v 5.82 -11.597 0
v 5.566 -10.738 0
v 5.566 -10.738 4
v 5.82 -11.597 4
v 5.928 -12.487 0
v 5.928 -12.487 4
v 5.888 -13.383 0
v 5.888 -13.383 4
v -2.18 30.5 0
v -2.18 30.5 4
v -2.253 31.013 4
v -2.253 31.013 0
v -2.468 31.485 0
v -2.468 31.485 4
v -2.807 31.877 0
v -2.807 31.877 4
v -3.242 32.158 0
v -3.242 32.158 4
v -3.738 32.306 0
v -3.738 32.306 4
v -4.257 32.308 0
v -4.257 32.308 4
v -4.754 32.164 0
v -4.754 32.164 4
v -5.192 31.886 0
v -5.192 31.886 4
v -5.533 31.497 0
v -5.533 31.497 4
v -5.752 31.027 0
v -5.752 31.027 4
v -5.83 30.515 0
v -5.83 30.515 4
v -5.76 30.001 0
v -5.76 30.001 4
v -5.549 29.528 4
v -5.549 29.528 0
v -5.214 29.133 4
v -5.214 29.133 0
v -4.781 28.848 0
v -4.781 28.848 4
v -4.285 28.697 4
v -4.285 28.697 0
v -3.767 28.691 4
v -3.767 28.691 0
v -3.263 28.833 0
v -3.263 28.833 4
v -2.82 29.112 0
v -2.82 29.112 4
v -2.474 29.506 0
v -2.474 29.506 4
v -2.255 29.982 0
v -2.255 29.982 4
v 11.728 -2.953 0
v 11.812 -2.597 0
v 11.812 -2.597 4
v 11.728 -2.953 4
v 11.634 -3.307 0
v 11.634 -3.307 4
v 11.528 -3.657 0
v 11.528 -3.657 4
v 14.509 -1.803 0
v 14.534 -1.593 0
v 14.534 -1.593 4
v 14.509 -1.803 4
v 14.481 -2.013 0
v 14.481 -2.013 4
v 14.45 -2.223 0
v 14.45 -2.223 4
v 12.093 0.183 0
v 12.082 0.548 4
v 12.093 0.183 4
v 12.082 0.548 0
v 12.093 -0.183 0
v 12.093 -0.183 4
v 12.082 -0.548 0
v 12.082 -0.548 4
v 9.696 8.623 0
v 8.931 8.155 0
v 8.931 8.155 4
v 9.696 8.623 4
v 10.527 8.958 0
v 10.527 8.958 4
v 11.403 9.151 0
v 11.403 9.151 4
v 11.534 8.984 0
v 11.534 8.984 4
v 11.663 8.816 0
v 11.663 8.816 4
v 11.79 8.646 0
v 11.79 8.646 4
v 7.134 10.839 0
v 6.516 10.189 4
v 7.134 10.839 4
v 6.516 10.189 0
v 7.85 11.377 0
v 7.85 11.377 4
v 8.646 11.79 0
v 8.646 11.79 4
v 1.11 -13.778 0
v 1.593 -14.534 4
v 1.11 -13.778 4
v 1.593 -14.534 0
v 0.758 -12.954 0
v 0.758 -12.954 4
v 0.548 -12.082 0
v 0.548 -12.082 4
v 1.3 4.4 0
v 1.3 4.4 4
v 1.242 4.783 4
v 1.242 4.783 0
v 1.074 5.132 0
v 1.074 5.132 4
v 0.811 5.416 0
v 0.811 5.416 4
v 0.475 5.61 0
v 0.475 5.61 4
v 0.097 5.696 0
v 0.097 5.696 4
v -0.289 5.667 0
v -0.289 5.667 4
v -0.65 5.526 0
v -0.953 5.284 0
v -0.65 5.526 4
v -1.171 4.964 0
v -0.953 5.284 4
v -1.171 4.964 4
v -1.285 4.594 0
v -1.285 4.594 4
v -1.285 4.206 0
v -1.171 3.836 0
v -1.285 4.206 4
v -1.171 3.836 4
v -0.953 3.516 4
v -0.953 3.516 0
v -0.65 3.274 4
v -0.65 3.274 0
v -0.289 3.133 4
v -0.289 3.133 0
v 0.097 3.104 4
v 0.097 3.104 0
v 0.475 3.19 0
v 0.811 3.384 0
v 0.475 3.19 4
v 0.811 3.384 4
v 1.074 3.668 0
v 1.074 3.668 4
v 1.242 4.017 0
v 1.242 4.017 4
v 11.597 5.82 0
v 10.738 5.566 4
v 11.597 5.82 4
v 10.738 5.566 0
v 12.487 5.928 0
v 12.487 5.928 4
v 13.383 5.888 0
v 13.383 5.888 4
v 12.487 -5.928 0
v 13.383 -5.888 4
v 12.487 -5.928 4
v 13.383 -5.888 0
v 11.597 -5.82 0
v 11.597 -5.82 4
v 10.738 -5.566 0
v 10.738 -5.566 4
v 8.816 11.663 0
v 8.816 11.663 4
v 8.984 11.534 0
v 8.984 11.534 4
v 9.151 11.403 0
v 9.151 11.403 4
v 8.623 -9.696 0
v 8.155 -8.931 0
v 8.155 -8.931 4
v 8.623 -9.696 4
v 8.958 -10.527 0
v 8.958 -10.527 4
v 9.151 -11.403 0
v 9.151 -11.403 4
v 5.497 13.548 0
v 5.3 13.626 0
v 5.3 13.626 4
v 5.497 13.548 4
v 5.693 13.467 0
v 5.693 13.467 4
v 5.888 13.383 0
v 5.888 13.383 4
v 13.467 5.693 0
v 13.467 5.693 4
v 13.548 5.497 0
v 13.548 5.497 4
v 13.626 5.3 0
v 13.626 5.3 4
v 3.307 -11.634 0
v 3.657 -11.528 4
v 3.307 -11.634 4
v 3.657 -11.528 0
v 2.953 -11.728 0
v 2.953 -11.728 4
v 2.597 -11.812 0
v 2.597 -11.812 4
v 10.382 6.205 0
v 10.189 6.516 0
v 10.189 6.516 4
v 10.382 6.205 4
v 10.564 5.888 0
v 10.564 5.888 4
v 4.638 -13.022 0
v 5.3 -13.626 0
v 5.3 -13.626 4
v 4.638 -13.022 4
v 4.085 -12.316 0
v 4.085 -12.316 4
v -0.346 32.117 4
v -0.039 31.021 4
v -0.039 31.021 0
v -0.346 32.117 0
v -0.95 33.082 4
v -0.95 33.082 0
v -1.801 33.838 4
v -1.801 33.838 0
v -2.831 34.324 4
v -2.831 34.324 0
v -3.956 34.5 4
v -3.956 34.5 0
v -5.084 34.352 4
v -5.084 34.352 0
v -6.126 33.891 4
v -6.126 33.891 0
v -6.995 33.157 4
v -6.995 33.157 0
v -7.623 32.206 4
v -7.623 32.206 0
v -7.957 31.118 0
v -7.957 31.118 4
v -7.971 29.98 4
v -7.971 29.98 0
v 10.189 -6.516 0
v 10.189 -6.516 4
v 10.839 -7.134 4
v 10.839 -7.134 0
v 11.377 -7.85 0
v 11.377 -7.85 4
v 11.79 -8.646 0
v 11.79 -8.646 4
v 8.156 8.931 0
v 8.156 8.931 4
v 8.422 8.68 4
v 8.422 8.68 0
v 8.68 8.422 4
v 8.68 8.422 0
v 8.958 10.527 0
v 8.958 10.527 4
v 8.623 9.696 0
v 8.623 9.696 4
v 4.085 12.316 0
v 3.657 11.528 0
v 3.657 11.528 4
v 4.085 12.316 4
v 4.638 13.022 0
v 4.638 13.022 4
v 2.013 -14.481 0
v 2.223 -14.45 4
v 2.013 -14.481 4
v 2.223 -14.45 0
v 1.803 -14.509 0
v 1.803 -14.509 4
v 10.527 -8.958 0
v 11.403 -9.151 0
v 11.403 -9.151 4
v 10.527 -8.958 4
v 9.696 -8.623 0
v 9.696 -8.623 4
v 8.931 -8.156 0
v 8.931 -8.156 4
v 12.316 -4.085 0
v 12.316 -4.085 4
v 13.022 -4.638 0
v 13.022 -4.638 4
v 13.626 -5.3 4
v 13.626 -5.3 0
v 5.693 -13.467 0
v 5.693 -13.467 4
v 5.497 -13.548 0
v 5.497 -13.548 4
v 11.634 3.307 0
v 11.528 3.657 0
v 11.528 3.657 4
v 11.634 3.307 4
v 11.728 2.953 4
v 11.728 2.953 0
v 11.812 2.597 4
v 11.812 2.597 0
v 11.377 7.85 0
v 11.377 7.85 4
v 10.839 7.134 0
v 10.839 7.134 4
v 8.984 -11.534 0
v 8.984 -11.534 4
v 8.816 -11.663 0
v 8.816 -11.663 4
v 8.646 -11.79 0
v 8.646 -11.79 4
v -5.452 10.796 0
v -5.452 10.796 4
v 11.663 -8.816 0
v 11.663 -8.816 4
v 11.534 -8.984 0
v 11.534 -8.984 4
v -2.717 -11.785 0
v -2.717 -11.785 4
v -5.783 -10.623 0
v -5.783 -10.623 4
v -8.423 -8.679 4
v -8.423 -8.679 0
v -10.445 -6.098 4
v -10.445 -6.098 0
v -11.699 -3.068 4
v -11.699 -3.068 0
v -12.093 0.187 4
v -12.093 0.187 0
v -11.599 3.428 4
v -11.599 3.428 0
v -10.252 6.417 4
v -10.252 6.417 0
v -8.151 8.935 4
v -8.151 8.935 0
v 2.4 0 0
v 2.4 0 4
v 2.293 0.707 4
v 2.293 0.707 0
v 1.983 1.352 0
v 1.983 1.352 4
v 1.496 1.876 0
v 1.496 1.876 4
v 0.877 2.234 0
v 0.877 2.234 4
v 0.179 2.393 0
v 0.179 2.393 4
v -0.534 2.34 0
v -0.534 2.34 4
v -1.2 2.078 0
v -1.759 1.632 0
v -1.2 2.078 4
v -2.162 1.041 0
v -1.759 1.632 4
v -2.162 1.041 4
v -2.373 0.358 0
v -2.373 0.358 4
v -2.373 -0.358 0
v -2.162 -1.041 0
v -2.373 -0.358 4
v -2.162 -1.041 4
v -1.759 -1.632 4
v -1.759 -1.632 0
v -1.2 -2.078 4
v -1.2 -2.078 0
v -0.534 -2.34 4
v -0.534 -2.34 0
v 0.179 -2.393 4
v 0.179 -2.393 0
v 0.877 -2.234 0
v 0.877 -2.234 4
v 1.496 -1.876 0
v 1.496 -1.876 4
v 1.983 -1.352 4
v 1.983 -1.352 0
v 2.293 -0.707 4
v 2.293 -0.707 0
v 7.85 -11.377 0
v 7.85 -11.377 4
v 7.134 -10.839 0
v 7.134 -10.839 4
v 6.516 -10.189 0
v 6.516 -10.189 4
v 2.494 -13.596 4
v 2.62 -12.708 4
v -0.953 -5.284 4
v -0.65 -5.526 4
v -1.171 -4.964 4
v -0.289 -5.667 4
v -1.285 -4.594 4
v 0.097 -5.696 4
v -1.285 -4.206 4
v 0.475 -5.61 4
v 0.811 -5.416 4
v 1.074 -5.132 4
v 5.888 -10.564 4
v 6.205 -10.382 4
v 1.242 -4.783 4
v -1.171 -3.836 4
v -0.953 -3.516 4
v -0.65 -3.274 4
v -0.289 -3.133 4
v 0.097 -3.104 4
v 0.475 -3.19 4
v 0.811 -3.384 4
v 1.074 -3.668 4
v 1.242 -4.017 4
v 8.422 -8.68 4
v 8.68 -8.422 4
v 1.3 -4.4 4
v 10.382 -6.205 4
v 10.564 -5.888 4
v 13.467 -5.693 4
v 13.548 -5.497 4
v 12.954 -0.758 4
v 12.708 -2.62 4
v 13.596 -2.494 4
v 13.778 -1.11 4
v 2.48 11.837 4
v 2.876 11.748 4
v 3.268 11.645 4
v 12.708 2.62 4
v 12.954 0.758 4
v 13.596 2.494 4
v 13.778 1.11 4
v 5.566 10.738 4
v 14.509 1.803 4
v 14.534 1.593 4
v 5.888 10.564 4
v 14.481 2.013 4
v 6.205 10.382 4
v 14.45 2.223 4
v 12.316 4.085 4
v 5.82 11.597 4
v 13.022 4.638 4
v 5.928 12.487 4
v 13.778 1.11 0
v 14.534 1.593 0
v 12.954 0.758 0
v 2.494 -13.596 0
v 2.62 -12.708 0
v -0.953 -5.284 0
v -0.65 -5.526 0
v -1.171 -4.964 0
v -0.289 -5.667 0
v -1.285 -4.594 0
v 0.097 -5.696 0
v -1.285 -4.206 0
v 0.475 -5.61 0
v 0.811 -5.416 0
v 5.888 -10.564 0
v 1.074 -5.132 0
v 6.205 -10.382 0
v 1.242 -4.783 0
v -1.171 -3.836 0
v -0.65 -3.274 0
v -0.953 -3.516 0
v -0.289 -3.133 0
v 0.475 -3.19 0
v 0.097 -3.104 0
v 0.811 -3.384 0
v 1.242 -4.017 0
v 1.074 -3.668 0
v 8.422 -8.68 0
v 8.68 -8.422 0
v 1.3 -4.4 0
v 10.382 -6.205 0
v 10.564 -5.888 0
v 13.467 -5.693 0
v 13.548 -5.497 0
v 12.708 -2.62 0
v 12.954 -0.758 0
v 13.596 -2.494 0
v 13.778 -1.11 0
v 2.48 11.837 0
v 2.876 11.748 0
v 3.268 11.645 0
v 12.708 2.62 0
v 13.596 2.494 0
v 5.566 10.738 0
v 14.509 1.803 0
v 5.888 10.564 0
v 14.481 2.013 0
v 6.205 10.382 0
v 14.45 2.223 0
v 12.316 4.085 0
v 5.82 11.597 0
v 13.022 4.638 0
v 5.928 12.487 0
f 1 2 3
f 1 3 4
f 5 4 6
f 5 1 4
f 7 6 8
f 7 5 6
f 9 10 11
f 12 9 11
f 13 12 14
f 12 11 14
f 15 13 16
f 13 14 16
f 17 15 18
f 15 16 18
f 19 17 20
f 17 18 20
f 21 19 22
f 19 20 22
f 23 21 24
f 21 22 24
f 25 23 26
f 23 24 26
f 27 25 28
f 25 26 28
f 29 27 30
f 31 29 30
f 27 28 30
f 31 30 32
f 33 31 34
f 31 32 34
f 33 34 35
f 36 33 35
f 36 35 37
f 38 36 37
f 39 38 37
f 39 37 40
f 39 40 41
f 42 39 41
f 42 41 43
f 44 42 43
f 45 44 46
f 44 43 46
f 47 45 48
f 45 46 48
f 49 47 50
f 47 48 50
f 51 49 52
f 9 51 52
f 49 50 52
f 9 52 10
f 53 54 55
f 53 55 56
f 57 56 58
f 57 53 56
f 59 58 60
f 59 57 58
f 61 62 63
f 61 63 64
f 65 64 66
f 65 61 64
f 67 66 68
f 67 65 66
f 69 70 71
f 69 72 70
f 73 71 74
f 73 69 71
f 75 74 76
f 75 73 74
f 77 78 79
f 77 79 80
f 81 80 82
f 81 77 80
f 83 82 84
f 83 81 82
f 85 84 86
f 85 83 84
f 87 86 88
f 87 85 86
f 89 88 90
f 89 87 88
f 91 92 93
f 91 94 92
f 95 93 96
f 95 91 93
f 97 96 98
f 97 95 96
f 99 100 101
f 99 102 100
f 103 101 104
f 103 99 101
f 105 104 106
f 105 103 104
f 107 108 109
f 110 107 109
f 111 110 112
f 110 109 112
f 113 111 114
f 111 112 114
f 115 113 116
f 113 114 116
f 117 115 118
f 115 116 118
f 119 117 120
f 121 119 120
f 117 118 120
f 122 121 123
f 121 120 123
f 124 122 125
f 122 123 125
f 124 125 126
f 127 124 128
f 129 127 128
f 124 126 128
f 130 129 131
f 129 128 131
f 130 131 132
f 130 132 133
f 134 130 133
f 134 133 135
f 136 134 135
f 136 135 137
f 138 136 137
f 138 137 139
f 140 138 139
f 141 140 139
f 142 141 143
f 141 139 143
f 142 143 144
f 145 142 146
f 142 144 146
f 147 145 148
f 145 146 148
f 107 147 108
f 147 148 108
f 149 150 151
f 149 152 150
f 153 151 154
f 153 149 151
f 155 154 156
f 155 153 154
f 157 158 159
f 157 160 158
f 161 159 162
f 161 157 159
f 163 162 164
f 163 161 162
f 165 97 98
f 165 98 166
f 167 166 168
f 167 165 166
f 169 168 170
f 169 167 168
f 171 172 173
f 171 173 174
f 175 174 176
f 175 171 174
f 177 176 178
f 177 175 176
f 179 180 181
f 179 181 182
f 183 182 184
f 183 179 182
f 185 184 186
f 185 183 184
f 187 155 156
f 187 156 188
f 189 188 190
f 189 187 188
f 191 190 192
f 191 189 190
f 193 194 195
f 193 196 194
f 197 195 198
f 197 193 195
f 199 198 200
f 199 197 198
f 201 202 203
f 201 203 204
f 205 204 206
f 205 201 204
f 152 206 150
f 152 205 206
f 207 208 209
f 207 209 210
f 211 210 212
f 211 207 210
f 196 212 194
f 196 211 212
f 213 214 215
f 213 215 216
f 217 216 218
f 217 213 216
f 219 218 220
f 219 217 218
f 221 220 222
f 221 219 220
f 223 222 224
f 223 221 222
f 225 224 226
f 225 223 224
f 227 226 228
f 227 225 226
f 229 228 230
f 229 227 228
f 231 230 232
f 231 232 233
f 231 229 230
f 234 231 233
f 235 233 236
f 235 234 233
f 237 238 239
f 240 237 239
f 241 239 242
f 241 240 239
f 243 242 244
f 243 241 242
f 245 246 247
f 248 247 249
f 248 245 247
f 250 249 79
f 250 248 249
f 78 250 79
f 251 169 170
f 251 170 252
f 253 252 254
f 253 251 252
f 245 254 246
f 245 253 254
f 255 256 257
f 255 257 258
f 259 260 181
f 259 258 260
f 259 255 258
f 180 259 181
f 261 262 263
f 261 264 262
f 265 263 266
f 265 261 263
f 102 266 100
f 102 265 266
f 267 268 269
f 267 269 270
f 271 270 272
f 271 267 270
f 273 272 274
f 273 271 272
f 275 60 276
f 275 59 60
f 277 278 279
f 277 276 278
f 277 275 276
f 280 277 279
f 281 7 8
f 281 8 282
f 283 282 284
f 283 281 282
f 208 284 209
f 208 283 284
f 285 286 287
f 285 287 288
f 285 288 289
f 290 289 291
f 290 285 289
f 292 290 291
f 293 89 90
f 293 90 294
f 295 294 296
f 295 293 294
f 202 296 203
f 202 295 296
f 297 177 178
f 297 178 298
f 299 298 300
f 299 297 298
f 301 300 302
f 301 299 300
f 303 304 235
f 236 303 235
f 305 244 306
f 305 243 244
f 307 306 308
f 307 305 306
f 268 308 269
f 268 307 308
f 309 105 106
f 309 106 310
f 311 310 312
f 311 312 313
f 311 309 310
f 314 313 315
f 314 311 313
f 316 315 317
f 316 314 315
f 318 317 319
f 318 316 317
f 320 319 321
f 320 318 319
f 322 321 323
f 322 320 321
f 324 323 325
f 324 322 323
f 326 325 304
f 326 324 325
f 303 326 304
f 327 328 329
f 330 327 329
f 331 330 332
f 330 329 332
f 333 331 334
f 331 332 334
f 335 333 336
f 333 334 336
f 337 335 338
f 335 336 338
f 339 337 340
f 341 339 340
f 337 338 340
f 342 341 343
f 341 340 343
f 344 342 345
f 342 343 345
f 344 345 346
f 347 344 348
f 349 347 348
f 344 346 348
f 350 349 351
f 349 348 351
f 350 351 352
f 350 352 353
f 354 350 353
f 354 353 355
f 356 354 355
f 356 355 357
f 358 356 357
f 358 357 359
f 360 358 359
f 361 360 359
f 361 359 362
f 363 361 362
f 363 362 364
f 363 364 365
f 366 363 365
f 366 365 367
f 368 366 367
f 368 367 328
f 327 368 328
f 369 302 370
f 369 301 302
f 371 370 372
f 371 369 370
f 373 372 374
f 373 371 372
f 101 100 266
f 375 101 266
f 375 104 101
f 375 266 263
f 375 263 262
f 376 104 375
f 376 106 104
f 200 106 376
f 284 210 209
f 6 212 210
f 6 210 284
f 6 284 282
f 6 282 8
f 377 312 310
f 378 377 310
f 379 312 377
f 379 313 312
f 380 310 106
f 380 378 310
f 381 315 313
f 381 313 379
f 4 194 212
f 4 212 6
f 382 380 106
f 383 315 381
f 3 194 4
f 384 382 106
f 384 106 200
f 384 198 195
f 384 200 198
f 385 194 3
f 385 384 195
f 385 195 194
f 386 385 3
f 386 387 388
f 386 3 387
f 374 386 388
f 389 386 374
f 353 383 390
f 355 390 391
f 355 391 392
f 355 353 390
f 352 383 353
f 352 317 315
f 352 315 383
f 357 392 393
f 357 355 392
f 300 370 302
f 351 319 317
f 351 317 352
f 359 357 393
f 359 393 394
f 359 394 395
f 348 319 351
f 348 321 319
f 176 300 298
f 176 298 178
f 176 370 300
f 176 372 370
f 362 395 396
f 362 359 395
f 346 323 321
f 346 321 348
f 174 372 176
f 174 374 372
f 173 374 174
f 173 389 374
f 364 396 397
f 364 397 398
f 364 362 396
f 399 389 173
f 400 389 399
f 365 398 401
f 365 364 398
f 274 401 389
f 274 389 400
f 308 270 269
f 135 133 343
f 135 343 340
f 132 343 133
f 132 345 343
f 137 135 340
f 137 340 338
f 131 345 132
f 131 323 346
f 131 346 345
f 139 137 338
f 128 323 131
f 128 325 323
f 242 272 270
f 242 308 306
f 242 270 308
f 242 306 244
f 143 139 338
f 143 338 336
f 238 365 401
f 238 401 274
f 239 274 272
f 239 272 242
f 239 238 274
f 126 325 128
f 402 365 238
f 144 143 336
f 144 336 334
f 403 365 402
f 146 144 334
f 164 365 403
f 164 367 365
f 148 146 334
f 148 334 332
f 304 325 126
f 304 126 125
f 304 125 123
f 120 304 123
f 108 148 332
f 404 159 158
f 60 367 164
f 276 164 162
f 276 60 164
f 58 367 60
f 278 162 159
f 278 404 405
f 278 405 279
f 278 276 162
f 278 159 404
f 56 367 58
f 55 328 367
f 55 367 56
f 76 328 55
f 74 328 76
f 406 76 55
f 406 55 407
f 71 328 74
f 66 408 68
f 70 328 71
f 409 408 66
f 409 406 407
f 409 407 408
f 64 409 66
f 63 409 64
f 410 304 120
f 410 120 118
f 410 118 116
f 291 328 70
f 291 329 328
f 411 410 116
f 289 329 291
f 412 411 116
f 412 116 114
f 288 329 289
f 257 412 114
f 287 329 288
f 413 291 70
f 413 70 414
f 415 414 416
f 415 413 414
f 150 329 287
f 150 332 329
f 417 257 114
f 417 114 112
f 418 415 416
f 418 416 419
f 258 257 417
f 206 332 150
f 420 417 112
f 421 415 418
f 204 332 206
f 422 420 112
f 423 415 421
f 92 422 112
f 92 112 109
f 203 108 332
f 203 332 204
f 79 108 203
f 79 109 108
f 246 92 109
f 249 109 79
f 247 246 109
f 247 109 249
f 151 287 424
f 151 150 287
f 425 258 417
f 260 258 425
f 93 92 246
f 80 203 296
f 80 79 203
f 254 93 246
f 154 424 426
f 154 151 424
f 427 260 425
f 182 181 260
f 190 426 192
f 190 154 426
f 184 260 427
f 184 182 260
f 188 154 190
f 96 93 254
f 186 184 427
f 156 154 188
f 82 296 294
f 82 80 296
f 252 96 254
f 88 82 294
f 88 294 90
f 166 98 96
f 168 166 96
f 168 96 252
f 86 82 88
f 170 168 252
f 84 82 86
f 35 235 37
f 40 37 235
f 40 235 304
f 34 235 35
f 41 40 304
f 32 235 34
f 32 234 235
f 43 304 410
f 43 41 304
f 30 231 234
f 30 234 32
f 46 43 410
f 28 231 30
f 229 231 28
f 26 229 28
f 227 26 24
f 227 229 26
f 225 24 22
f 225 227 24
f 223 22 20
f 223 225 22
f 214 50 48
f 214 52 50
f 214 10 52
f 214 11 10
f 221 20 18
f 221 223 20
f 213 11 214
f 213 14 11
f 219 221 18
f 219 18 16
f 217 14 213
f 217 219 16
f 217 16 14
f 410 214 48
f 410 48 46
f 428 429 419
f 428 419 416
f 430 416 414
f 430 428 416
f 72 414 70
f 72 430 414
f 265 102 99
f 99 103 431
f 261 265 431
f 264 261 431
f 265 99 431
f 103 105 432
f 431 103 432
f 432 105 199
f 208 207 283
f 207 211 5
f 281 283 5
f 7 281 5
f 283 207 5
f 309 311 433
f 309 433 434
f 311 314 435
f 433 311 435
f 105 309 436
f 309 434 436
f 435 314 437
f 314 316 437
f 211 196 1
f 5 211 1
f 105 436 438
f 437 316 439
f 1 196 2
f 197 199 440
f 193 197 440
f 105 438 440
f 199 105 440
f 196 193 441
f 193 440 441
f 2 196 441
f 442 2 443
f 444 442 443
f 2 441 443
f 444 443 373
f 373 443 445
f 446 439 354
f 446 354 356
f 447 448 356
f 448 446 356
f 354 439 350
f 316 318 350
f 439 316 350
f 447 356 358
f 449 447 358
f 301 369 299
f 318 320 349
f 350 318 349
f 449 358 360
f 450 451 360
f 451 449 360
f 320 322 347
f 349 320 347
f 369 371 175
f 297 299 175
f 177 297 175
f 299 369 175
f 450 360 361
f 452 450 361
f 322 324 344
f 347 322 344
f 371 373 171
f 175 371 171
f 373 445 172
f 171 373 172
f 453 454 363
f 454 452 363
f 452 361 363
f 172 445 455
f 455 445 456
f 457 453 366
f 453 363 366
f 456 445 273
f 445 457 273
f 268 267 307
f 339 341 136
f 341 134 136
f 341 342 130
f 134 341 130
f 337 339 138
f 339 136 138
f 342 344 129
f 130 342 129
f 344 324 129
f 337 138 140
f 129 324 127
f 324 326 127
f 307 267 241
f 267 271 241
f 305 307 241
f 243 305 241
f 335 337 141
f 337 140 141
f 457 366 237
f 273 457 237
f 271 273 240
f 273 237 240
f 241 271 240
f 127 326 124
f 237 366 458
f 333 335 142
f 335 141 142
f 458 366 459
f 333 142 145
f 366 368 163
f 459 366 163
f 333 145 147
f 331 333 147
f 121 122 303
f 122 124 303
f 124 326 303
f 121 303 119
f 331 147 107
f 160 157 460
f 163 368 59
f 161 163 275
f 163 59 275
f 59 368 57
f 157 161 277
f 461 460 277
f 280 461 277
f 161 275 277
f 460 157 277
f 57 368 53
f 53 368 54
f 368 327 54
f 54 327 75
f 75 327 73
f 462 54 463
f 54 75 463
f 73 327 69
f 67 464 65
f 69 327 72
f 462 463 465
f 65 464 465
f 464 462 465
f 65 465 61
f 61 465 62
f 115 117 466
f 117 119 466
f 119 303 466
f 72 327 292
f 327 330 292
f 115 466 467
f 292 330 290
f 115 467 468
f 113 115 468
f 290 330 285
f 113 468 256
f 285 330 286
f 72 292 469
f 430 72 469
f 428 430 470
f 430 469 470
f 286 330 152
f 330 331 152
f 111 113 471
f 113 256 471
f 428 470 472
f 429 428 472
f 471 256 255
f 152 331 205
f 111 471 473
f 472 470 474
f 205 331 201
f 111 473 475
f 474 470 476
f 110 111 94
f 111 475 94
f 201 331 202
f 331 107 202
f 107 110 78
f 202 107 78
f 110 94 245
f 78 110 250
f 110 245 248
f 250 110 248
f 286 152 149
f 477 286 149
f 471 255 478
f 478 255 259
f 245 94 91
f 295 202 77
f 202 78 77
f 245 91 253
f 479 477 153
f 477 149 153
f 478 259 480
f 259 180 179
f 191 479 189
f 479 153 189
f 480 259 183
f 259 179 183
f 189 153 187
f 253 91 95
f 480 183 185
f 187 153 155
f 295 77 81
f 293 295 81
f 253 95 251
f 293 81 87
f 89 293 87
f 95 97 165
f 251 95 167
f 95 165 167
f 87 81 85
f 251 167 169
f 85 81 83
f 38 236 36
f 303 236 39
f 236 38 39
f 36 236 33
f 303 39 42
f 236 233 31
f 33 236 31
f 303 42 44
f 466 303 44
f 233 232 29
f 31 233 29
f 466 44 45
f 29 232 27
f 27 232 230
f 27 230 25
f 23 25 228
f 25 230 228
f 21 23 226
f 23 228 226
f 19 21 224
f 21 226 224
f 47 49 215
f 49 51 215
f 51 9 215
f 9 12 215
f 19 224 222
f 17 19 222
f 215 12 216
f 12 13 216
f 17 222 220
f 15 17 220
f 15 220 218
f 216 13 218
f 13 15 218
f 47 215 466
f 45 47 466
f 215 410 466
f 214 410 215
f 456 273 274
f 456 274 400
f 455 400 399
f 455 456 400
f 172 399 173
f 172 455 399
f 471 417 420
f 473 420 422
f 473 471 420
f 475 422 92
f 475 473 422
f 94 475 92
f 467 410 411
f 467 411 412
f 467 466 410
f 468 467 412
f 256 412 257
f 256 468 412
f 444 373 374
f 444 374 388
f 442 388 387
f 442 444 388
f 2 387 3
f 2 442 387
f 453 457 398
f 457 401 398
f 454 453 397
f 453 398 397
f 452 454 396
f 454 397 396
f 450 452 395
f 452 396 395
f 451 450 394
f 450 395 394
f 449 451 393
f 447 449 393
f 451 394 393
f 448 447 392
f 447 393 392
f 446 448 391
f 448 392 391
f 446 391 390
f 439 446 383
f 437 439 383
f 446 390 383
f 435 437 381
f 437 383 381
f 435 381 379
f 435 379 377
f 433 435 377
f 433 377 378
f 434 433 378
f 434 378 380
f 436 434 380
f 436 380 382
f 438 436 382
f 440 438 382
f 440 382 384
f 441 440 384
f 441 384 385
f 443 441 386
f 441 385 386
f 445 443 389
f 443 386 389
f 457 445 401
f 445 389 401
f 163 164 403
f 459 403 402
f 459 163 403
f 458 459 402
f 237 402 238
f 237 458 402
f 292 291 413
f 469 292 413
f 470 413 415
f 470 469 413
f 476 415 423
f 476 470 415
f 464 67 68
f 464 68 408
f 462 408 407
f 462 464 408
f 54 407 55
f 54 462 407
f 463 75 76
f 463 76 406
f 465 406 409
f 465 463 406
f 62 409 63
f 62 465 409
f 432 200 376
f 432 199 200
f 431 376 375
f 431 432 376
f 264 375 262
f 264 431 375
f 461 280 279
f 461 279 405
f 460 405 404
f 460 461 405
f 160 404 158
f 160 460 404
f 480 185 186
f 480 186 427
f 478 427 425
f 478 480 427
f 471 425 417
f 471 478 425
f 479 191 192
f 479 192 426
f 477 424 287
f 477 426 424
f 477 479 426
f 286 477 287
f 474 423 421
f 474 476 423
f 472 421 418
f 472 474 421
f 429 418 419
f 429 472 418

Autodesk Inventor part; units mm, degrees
ref_plane "YZ Plane" through (0, 0, 0) normal (1, 0, 0) x (0, 1, 0)
ref_plane "XZ Plane" through (0, 0, 0) normal (0, 1, 0) x (-1, 0, 0)
ref_plane "XY Plane" through (0, 0, 0) normal (0, 0, 1) x (1, 0, 0)
sketch "Náčrt1" plane through (0, 0, 0) normal (0, 0, 1) x (1, 0, 0)
  circle A0 centre (0, 0) radius 12.0945
  line L0 (0, 0) -> (0.5842, 13.9377)
  arc A1 (5.5661, 10.7376) -> (5.8875, 13.3827) centre (0.5319, 12.6914) ccw
  arc A2 (8.1555, 8.9311) -> (9.1506, 11.4029) centre (3.7986, 12.1212) ccw
  arc A3 (10.1892, 6.516) -> (11.7901, 8.646) centre (6.8063, 10.7251) ccw
  arc A4 (11.5284, 3.6568) -> (13.6261, 5.2999) centre (9.3503, 8.598) ccw
  arc A5 (12.0821, 0.5484) -> (14.5335, 1.5926) centre (11.257, 5.885) ccw
  arc A6 (11.8123, -2.5973) -> (14.4505, -2.2232) centre (12.3966, 2.771) ccw
  arc A7 (10.7376, -5.5661) -> (13.3827, -5.8875) centre (12.6914, -0.5319) ccw
  arc A8 (8.9311, -8.1555) -> (11.4029, -9.1506) centre (12.1212, -3.7986) ccw
  arc A9 (6.516, -10.1892) -> (8.646, -11.7901) centre (10.7251, -6.8063) ccw
  arc A10 (3.6568, -11.5284) -> (5.2999, -13.6261) centre (8.598, -9.3503) ccw
  arc A11 (0.5484, -12.0821) -> (1.5926, -14.5335) centre (5.885, -11.257) ccw
  line L1 (0, 0) -> (0, 15.3936)
  arc A12 (5.2999, 13.6261) -> (3.6568, 11.5284) centre (8.598, 9.3503) ccw
  arc A13 (8.646, 11.7901) -> (6.516, 10.1892) centre (10.7251, 6.8063) ccw
  arc A14 (11.4029, 9.1506) -> (8.9311, 8.1555) centre (12.1212, 3.7986) ccw
  arc A15 (13.3827, 5.8875) -> (10.7376, 5.5661) centre (12.6914, 0.5319) ccw
  arc A16 (14.4505, 2.2232) -> (11.8123, 2.5973) centre (12.3966, -2.771) ccw
  arc A17 (14.5335, -1.5926) -> (12.0821, -0.5484) centre (11.257, -5.885) ccw
  arc A18 (13.6261, -5.2999) -> (11.5284, -3.6568) centre (9.3503, -8.598) ccw
  arc A19 (11.7901, -8.646) -> (10.1892, -6.516) centre (6.8063, -10.7251) ccw
  arc A20 (9.1506, -11.4029) -> (8.1555, -8.9311) centre (3.7986, -12.1212) ccw
  arc A21 (5.8875, -13.3827) -> (5.5661, -10.7376) centre (0.5319, -12.6914) ccw
  arc A22 (2.2232, -14.4505) -> (2.5973, -11.8123) centre (-2.771, -12.3966) ccw
  arc A23 (5.8875, 13.3827) -> (5.2999, 13.6261) centre (0, 0) ccw
  arc A24 (9.1506, 11.4029) -> (8.646, 11.7901) centre (0, 0) ccw
  arc A25 (11.7901, 8.646) -> (11.4029, 9.1506) centre (0, 0) ccw
  arc A26 (13.6261, 5.2999) -> (13.3827, 5.8875) centre (0, 0) ccw
  arc A27 (14.5335, 1.5926) -> (14.4505, 2.2232) centre (0, 0) ccw
  arc A28 (14.4505, -2.2232) -> (14.5335, -1.5926) centre (0, 0) ccw
  arc A29 (13.3827, -5.8875) -> (13.6261, -5.2999) centre (0, 0) ccw
  arc A30 (11.4029, -9.1506) -> (11.7901, -8.646) centre (0, 0) ccw
  arc A31 (8.646, -11.7901) -> (9.1506, -11.4029) centre (0, 0) ccw
  arc A32 (1.5926, -14.5335) -> (2.2232, -14.4505) centre (0, 0) ccw
  arc A33 (5.2999, -13.6261) -> (5.8875, -13.3827) centre (0, 0) ccw
  dimension "d0" = 24.189
  dimension "d13" = 150
  dimension "d19" = 150
sketch "Náčrt2" plane through (0, 0, 0) normal (0, 0, 1) x (1, 0, 0)
  circle A0 centre (0, 0) radius 12.0945 projected
  circle A1 centre (0, 0) radius 12.0945
extrude "Vysunutí1" add sketch "Náčrt2" along normal blind 4
extrude "Vysunutí2" add sketch "Náčrt1" along normal blind 4 contours A0 A12 A23 A1
pattern_circular "Kruhové pole1" count 11 over 150 about axis through (0, 0, 0) along (0, 0, -1) of "Vysunutí2"
sketch "Náčrt3" plane through (0, 0, 4) normal (0, 0, 1) x (1, 0, 0)
  line L0 (0, 0) -> (-4.0046, 30.5002)
  circle A0 centre (-4.0046, 30.5002) radius 1.825
  arc A1 (-0.0386, 31.0209) -> (-7.9706, 29.9795) centre (-4.0046, 30.5002) ccw
  line L1 (-3.966, -0.5207) -> (-7.9706, 29.9795)
  line L2 (3.966, 0.5207) -> (-0.0386, 31.0209)
  line L3 (-5.0618, 7.8256) -> (2.8701, 8.867)
  dimension "d29" = 30.762
  dimension "d30" = 3.65
  dimension "d31" = 8
  dimension "d32" = 4
  dimension "d33" = 4
extrude "Vysunutí3" add sketch "Náčrt3" against normal blind 4
sketch "Náčrt4" plane through (0, 0, 4) normal (0, 0, 1) x (1, 0, 0)
  circle A0 centre (0, 0) radius 2.4
  line L0 (0, 0) -> (0, -4.4)
  circle A1 centre (0, -4.4) radius 1.3
  line L1 (0, 0) -> (0, 4.4)
  circle A2 centre (0, 4.4) radius 1.3
  dimension "d36" = 4.8
  dimension "d37" = 4.4
  dimension "d38" = 2.6
  dimension "d39" = 4.4
  dimension "d40" = 2.6
extrude "Vysunutí4" cut sketch "Náčrt4" against normal blind 4
properties part number "zubate_kolo2" material "ABS Plastic"
